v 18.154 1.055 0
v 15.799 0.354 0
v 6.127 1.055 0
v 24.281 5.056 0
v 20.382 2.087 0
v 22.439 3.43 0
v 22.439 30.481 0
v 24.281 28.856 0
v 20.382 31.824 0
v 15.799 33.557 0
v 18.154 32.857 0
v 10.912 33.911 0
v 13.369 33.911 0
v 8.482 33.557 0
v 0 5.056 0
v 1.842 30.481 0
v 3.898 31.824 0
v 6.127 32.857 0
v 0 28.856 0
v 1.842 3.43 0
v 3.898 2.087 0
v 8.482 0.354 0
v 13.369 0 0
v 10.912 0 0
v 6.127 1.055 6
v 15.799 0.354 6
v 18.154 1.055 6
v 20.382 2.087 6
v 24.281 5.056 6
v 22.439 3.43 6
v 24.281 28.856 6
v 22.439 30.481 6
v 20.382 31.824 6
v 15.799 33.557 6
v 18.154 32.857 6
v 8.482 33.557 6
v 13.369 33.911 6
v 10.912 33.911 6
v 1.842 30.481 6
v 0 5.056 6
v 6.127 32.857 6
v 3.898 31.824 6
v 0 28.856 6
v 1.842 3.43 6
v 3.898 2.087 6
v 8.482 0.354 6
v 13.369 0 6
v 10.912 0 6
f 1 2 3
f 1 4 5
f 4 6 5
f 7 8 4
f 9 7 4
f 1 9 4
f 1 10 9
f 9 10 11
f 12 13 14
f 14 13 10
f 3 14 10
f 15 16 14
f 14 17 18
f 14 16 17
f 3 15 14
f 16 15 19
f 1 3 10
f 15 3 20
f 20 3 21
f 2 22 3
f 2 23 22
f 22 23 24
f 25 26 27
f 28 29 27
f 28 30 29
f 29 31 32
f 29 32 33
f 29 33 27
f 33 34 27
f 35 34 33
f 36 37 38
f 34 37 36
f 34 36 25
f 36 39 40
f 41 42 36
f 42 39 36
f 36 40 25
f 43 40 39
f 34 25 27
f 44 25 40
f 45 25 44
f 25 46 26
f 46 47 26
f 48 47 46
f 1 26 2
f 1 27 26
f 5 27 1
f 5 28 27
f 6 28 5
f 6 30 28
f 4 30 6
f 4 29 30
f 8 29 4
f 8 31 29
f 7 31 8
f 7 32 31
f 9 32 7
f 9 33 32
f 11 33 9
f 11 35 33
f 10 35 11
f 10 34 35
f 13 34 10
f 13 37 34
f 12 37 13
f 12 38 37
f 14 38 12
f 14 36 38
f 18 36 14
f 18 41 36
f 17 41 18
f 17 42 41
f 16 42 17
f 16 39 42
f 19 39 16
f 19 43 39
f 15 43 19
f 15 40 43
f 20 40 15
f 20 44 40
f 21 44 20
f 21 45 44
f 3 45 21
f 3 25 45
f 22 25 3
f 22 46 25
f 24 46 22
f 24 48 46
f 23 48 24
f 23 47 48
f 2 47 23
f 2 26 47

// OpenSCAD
$fn = 32;

// ----------------------------------------------------------------------
// Eccentric disc: double_d, 6 mm thick
// ----------------------------------------------------------------------

// --- parameters (mm) ---
profile_height = 6;       // extrusion height
profile_points = 24;      // points of the closed outline

profile = [[24.281, 28.856], [22.439, 30.481], [20.382, 31.824], [18.154, 32.857], [15.799, 33.557], [13.369, 33.911], [10.912, 33.911], [8.482, 33.557], [6.127, 32.857], [3.898, 31.824], [1.842, 30.481], [0, 28.856], [0, 5.056], [1.842, 3.43], [3.898, 2.087], [6.127, 1.055], [8.482, 0.354], [10.912, 0], [13.369, 0], [15.799, 0.354], [18.154, 1.055], [20.382, 2.087], [22.439, 3.43], [24.281, 5.056]];  // single closed polygon, 24 points, counter clockwise

// --- the one profile operation ---
linear_extrude(height = profile_height) polygon(points = profile);
